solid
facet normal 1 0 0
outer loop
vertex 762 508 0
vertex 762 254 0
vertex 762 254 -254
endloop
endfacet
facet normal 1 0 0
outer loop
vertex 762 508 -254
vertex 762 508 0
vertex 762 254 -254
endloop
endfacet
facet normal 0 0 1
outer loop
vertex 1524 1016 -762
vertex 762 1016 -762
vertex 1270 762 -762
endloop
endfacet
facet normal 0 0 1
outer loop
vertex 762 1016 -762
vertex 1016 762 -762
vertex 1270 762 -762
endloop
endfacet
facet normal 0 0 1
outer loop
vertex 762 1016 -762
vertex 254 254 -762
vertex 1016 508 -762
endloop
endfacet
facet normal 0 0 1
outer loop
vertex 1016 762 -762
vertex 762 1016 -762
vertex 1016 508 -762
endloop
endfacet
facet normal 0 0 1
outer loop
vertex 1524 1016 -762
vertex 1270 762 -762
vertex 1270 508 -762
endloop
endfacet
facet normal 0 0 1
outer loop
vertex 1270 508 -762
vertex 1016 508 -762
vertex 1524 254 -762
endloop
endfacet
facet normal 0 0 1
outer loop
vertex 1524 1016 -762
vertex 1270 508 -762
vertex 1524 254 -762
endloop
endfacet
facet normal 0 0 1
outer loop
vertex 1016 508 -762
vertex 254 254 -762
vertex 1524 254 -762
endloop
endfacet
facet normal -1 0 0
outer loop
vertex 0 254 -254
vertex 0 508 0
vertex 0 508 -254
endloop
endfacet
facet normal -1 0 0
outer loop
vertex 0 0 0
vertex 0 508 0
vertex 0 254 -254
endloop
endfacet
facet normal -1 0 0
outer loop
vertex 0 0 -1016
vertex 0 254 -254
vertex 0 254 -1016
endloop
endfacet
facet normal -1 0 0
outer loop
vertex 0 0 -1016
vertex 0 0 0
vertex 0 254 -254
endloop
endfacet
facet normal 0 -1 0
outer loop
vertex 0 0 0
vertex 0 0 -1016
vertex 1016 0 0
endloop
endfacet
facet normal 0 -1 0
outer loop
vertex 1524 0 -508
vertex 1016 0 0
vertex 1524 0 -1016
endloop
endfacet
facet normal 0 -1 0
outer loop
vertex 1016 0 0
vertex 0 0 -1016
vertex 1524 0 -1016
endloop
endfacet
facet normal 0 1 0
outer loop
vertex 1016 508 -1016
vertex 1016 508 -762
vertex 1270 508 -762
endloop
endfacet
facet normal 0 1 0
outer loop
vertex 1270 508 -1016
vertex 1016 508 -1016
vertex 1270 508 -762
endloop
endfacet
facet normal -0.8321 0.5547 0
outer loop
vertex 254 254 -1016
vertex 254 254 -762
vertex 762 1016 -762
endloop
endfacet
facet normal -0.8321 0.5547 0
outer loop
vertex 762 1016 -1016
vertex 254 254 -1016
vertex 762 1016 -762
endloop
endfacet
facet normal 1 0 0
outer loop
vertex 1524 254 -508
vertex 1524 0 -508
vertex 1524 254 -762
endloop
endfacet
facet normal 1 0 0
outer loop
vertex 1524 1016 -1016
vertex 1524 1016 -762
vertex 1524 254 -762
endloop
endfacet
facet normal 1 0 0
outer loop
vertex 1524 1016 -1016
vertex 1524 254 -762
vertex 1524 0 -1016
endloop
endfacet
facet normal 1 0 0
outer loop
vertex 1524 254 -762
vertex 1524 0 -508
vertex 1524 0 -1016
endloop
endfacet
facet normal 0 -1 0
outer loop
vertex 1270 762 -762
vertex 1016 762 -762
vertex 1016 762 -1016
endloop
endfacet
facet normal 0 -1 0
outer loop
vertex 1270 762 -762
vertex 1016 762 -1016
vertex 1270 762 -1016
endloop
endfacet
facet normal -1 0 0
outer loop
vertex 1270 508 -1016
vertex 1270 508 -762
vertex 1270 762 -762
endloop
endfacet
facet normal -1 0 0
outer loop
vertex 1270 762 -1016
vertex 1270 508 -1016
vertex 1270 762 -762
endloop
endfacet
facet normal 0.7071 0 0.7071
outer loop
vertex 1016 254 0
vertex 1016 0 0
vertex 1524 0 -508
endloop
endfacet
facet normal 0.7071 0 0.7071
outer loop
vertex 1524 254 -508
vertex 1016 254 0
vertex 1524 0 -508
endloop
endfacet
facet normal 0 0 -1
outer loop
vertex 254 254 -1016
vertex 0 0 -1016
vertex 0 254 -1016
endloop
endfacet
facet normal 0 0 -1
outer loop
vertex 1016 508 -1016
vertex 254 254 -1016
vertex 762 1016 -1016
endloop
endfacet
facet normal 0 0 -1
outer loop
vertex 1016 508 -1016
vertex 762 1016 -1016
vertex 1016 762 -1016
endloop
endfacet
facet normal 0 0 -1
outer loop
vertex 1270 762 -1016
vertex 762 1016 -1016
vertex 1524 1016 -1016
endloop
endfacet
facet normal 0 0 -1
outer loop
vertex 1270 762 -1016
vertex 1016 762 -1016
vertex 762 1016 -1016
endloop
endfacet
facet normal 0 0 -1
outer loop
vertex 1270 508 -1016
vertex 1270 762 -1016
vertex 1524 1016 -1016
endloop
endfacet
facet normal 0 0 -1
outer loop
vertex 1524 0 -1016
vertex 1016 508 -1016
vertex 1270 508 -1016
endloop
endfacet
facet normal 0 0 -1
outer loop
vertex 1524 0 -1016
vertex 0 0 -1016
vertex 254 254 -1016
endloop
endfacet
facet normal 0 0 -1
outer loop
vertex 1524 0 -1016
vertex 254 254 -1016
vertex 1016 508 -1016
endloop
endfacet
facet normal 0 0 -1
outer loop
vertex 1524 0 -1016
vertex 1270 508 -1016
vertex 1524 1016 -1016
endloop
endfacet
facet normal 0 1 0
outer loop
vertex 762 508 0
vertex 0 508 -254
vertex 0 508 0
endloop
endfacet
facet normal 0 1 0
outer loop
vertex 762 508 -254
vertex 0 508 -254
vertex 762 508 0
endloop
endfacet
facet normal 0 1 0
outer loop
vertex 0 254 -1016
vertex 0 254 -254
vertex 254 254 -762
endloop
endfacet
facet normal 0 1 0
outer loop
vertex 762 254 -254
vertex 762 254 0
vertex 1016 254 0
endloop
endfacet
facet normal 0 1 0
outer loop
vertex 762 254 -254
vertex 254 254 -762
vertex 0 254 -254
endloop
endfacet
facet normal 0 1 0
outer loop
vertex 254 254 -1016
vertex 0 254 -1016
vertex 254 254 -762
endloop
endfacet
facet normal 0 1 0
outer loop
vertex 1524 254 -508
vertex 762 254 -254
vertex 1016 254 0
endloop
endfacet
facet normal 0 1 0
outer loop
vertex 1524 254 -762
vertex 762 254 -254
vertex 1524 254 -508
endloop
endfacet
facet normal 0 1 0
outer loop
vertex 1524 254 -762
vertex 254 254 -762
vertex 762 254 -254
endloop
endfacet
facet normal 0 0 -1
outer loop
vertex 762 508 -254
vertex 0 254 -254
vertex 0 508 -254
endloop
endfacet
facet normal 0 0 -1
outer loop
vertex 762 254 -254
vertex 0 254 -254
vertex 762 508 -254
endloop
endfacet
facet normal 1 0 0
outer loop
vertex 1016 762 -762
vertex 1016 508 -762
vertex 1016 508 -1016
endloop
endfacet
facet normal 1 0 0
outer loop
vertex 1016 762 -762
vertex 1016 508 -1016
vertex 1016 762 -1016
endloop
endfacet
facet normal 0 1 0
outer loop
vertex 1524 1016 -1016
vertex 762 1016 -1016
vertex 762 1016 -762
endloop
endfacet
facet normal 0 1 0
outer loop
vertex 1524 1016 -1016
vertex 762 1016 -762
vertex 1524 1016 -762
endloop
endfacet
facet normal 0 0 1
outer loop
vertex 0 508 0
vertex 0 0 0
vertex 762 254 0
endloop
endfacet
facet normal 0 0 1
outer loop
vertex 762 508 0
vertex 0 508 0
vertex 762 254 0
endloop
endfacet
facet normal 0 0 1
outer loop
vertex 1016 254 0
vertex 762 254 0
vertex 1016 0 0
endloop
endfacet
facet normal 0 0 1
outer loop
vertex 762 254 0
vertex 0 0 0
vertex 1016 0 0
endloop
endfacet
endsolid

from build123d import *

# Parameters (mm, degrees)
BOSS_EXTRUDE1_DEPTH = 254
SKETCH1_3_W         = 762
SKETCH1_3_H         = 254
BOSS_EXTRUDE2_DEPTH = 508
SKETCH1_4_W         = 1270
SKETCH1_4_H         = 254
BOSS_EXTRUDE3_DEPTH = 1016
SKETCH2_W           = 254
SKETCH2_H           = 254
CUT_EXTRUDE1_DEPTH  = 254


with BuildPart() as part:
    # Sketch1 → Boss-Extrude1 (new body)
    with BuildSketch(Plane(origin=(0, 0, 0), x_dir=(1, 0, 0), z_dir=(0, 1, 0))):
        Polygon((0, 1016), (0, 254), (762, 254), (762, 0), (1016, 0), (1524, 508), (1524, 762), (254, 762), (254, 1016), align=None)
    extrude(amount=BOSS_EXTRUDE1_DEPTH)

    # Sketch1<3> → Boss-Extrude2 (add)
    with BuildSketch(Plane(origin=(0, 0, 0), x_dir=(1, 0, 0), z_dir=(0, 1, 0))):
        with Locations((381, 127)):
            Rectangle(SKETCH1_3_W, SKETCH1_3_H)
    extrude(amount=BOSS_EXTRUDE2_DEPTH)

    # Sketch1<4> → Boss-Extrude3 (add)
    with BuildSketch(Plane(origin=(0, 0, 0), x_dir=(1, 0, 0), z_dir=(0, 1, 0))):
        with Locations((889, 889)):
            Rectangle(SKETCH1_4_W, SKETCH1_4_H)
    extrude(amount=BOSS_EXTRUDE3_DEPTH)

    # Sketch2 → Cut-Extrude1 (cut)
    with BuildSketch(Plane.XY.offset(-762)):
        Polygon((254, 254), (762, 1016), (254, 1016), align=None)
        with Locations((1143, 635)):
            Rectangle(SKETCH2_W, SKETCH2_H)
    extrude(amount=-CUT_EXTRUDE1_DEPTH, mode=Mode.SUBTRACT)


solid = part.part
